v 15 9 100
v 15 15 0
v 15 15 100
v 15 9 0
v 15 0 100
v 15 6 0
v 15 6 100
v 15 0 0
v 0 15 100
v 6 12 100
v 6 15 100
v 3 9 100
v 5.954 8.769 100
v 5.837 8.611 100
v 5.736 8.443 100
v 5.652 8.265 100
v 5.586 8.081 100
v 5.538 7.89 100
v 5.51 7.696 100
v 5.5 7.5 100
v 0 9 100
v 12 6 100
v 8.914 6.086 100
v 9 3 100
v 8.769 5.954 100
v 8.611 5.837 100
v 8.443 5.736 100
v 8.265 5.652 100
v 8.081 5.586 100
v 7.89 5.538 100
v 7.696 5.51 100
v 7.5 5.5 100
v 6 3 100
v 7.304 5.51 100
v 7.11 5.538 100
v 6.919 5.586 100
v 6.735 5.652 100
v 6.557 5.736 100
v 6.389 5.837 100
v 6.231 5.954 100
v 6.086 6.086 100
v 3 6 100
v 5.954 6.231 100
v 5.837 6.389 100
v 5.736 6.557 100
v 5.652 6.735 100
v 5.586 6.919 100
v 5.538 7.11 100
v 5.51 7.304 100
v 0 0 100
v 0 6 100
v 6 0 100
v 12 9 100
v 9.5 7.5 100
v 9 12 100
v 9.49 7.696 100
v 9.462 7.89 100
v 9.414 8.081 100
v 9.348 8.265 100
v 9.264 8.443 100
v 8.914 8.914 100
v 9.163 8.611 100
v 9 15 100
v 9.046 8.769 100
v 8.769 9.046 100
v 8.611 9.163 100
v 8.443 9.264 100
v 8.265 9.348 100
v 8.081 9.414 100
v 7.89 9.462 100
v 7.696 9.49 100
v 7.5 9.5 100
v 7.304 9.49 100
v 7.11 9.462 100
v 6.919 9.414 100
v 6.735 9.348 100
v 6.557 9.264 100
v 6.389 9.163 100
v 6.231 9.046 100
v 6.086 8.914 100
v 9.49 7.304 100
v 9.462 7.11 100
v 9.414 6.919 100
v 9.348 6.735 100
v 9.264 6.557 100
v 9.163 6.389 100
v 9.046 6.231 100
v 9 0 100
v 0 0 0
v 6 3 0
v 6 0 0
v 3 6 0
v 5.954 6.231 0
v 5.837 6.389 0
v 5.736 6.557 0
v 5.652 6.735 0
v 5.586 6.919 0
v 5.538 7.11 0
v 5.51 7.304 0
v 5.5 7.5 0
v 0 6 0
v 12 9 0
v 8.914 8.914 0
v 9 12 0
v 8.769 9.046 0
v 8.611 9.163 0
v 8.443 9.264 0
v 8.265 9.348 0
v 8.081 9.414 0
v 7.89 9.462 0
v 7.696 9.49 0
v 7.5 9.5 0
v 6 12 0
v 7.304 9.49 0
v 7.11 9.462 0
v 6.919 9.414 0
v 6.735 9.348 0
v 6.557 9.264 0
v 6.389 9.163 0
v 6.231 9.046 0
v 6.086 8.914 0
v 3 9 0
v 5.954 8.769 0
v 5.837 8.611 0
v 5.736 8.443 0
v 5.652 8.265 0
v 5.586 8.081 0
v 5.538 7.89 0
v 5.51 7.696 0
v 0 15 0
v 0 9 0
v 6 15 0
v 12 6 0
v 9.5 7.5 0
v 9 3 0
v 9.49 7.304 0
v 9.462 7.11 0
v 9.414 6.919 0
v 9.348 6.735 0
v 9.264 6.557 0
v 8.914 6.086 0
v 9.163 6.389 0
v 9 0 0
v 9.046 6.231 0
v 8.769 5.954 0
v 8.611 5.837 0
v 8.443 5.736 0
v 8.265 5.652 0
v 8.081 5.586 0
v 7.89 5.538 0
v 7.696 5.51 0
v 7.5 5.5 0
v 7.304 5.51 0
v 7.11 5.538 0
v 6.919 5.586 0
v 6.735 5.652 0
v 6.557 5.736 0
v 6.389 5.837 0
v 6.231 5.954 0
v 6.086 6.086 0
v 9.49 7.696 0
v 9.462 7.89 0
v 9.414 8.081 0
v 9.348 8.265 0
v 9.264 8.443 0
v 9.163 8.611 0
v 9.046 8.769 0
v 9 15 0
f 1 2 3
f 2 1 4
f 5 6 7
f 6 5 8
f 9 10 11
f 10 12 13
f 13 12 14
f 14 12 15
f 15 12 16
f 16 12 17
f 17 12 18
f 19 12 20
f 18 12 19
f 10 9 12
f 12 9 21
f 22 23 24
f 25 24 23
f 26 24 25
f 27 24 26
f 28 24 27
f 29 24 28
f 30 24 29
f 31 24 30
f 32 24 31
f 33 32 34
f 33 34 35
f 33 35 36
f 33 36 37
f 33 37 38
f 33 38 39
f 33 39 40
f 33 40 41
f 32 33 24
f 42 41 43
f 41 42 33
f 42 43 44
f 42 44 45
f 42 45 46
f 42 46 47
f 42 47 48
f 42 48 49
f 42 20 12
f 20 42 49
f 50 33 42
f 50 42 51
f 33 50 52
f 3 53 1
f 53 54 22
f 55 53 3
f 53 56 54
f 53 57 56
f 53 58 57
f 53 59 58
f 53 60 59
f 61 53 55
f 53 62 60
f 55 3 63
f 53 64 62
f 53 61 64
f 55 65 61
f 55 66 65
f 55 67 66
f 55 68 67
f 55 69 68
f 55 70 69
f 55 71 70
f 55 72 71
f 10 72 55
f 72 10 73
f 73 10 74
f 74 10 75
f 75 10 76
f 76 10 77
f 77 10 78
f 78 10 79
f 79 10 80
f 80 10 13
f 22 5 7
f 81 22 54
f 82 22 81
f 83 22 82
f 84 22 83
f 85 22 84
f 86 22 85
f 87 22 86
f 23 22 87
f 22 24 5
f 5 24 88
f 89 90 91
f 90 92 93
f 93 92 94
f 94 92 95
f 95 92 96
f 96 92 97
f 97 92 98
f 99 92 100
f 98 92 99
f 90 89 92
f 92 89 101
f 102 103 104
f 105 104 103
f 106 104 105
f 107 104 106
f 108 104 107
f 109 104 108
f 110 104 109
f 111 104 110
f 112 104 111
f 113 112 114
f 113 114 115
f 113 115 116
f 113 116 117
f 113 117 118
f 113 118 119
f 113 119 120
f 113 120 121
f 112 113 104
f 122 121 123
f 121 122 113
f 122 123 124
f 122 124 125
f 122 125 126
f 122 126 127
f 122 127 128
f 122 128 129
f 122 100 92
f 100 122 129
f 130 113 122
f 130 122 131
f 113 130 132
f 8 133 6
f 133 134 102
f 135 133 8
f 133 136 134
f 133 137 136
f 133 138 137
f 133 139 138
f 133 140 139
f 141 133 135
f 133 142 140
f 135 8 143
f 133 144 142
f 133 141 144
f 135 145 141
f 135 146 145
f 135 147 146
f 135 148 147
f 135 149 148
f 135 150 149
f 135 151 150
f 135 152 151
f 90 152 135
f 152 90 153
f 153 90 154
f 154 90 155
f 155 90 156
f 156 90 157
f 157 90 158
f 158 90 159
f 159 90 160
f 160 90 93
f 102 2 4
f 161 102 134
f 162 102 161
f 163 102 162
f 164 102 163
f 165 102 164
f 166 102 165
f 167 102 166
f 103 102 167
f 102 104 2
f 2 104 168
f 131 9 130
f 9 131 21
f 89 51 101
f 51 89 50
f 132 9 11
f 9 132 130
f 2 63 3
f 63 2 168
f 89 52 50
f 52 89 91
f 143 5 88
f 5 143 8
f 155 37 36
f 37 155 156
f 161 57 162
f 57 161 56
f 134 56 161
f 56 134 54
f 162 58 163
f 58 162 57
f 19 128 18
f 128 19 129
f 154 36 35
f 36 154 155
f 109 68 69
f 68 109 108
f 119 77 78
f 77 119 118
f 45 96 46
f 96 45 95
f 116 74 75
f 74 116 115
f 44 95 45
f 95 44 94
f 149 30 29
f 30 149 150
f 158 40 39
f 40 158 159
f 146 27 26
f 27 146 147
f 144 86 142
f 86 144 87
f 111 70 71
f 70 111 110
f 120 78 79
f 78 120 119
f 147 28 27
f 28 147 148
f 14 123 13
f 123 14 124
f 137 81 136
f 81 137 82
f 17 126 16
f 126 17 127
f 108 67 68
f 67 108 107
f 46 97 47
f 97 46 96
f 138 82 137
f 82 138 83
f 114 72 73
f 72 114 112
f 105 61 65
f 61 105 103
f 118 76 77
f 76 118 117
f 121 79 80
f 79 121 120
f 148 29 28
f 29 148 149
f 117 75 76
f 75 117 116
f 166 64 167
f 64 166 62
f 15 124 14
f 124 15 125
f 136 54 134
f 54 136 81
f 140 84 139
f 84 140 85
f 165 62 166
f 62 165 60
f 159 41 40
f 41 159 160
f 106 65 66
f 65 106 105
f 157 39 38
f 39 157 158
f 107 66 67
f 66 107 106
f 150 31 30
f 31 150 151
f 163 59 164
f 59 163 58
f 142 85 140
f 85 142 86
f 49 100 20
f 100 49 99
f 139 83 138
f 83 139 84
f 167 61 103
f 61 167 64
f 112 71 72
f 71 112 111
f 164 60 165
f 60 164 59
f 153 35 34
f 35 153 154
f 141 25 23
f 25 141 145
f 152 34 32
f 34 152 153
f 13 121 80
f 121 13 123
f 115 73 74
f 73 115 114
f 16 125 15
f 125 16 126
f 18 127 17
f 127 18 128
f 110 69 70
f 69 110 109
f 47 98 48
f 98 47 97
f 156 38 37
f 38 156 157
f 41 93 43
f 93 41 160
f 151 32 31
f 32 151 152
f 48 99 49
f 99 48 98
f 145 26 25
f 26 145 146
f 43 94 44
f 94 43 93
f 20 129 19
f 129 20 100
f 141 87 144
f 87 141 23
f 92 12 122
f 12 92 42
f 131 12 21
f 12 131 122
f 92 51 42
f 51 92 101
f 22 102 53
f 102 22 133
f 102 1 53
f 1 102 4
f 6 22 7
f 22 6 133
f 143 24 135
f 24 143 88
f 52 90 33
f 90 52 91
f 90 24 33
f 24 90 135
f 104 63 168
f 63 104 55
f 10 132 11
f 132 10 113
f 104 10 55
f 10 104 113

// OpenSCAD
// 15mm x 15mm aluminium extrusion profile, 100mm long (single connected solid)

$fn = 64;

size = 15.0;
len  = 100.0;

// Profile feature sizes (kept modest and fully connected)
slot_w = 3.0;     // T-slot opening width
slot_d = 3.0;     // T-slot depth from each face
bore_r = 2.0;     // center bore radius

module extrusion_15x15(L=len) {
    difference() {
        // Main solid
        cube([size, size, L], center=false);

        // Center bore (through)
        translate([size/2, size/2, -0.1])
            cylinder(h=L + 0.2, r=bore_r, center=false);

        // Four shallow face slots (through along length)
        // Left face
        translate([-0.1, size/2 - slot_w/2, -0.1])
            cube([slot_d + 0.1, slot_w, L + 0.2], center=false);

        // Right face
        translate([size - slot_d, size/2 - slot_w/2, -0.1])
            cube([slot_d + 0.1, slot_w, L + 0.2], center=false);

        // Bottom face
        translate([size/2 - slot_w/2, -0.1, -0.1])
            cube([slot_w, slot_d + 0.1, L + 0.2], center=false);

        // Top face
        translate([size/2 - slot_w/2, size - slot_d, -0.1])
            cube([slot_w, slot_d + 0.1, L + 0.2], center=false);
    }
}

extrusion_15x15();
